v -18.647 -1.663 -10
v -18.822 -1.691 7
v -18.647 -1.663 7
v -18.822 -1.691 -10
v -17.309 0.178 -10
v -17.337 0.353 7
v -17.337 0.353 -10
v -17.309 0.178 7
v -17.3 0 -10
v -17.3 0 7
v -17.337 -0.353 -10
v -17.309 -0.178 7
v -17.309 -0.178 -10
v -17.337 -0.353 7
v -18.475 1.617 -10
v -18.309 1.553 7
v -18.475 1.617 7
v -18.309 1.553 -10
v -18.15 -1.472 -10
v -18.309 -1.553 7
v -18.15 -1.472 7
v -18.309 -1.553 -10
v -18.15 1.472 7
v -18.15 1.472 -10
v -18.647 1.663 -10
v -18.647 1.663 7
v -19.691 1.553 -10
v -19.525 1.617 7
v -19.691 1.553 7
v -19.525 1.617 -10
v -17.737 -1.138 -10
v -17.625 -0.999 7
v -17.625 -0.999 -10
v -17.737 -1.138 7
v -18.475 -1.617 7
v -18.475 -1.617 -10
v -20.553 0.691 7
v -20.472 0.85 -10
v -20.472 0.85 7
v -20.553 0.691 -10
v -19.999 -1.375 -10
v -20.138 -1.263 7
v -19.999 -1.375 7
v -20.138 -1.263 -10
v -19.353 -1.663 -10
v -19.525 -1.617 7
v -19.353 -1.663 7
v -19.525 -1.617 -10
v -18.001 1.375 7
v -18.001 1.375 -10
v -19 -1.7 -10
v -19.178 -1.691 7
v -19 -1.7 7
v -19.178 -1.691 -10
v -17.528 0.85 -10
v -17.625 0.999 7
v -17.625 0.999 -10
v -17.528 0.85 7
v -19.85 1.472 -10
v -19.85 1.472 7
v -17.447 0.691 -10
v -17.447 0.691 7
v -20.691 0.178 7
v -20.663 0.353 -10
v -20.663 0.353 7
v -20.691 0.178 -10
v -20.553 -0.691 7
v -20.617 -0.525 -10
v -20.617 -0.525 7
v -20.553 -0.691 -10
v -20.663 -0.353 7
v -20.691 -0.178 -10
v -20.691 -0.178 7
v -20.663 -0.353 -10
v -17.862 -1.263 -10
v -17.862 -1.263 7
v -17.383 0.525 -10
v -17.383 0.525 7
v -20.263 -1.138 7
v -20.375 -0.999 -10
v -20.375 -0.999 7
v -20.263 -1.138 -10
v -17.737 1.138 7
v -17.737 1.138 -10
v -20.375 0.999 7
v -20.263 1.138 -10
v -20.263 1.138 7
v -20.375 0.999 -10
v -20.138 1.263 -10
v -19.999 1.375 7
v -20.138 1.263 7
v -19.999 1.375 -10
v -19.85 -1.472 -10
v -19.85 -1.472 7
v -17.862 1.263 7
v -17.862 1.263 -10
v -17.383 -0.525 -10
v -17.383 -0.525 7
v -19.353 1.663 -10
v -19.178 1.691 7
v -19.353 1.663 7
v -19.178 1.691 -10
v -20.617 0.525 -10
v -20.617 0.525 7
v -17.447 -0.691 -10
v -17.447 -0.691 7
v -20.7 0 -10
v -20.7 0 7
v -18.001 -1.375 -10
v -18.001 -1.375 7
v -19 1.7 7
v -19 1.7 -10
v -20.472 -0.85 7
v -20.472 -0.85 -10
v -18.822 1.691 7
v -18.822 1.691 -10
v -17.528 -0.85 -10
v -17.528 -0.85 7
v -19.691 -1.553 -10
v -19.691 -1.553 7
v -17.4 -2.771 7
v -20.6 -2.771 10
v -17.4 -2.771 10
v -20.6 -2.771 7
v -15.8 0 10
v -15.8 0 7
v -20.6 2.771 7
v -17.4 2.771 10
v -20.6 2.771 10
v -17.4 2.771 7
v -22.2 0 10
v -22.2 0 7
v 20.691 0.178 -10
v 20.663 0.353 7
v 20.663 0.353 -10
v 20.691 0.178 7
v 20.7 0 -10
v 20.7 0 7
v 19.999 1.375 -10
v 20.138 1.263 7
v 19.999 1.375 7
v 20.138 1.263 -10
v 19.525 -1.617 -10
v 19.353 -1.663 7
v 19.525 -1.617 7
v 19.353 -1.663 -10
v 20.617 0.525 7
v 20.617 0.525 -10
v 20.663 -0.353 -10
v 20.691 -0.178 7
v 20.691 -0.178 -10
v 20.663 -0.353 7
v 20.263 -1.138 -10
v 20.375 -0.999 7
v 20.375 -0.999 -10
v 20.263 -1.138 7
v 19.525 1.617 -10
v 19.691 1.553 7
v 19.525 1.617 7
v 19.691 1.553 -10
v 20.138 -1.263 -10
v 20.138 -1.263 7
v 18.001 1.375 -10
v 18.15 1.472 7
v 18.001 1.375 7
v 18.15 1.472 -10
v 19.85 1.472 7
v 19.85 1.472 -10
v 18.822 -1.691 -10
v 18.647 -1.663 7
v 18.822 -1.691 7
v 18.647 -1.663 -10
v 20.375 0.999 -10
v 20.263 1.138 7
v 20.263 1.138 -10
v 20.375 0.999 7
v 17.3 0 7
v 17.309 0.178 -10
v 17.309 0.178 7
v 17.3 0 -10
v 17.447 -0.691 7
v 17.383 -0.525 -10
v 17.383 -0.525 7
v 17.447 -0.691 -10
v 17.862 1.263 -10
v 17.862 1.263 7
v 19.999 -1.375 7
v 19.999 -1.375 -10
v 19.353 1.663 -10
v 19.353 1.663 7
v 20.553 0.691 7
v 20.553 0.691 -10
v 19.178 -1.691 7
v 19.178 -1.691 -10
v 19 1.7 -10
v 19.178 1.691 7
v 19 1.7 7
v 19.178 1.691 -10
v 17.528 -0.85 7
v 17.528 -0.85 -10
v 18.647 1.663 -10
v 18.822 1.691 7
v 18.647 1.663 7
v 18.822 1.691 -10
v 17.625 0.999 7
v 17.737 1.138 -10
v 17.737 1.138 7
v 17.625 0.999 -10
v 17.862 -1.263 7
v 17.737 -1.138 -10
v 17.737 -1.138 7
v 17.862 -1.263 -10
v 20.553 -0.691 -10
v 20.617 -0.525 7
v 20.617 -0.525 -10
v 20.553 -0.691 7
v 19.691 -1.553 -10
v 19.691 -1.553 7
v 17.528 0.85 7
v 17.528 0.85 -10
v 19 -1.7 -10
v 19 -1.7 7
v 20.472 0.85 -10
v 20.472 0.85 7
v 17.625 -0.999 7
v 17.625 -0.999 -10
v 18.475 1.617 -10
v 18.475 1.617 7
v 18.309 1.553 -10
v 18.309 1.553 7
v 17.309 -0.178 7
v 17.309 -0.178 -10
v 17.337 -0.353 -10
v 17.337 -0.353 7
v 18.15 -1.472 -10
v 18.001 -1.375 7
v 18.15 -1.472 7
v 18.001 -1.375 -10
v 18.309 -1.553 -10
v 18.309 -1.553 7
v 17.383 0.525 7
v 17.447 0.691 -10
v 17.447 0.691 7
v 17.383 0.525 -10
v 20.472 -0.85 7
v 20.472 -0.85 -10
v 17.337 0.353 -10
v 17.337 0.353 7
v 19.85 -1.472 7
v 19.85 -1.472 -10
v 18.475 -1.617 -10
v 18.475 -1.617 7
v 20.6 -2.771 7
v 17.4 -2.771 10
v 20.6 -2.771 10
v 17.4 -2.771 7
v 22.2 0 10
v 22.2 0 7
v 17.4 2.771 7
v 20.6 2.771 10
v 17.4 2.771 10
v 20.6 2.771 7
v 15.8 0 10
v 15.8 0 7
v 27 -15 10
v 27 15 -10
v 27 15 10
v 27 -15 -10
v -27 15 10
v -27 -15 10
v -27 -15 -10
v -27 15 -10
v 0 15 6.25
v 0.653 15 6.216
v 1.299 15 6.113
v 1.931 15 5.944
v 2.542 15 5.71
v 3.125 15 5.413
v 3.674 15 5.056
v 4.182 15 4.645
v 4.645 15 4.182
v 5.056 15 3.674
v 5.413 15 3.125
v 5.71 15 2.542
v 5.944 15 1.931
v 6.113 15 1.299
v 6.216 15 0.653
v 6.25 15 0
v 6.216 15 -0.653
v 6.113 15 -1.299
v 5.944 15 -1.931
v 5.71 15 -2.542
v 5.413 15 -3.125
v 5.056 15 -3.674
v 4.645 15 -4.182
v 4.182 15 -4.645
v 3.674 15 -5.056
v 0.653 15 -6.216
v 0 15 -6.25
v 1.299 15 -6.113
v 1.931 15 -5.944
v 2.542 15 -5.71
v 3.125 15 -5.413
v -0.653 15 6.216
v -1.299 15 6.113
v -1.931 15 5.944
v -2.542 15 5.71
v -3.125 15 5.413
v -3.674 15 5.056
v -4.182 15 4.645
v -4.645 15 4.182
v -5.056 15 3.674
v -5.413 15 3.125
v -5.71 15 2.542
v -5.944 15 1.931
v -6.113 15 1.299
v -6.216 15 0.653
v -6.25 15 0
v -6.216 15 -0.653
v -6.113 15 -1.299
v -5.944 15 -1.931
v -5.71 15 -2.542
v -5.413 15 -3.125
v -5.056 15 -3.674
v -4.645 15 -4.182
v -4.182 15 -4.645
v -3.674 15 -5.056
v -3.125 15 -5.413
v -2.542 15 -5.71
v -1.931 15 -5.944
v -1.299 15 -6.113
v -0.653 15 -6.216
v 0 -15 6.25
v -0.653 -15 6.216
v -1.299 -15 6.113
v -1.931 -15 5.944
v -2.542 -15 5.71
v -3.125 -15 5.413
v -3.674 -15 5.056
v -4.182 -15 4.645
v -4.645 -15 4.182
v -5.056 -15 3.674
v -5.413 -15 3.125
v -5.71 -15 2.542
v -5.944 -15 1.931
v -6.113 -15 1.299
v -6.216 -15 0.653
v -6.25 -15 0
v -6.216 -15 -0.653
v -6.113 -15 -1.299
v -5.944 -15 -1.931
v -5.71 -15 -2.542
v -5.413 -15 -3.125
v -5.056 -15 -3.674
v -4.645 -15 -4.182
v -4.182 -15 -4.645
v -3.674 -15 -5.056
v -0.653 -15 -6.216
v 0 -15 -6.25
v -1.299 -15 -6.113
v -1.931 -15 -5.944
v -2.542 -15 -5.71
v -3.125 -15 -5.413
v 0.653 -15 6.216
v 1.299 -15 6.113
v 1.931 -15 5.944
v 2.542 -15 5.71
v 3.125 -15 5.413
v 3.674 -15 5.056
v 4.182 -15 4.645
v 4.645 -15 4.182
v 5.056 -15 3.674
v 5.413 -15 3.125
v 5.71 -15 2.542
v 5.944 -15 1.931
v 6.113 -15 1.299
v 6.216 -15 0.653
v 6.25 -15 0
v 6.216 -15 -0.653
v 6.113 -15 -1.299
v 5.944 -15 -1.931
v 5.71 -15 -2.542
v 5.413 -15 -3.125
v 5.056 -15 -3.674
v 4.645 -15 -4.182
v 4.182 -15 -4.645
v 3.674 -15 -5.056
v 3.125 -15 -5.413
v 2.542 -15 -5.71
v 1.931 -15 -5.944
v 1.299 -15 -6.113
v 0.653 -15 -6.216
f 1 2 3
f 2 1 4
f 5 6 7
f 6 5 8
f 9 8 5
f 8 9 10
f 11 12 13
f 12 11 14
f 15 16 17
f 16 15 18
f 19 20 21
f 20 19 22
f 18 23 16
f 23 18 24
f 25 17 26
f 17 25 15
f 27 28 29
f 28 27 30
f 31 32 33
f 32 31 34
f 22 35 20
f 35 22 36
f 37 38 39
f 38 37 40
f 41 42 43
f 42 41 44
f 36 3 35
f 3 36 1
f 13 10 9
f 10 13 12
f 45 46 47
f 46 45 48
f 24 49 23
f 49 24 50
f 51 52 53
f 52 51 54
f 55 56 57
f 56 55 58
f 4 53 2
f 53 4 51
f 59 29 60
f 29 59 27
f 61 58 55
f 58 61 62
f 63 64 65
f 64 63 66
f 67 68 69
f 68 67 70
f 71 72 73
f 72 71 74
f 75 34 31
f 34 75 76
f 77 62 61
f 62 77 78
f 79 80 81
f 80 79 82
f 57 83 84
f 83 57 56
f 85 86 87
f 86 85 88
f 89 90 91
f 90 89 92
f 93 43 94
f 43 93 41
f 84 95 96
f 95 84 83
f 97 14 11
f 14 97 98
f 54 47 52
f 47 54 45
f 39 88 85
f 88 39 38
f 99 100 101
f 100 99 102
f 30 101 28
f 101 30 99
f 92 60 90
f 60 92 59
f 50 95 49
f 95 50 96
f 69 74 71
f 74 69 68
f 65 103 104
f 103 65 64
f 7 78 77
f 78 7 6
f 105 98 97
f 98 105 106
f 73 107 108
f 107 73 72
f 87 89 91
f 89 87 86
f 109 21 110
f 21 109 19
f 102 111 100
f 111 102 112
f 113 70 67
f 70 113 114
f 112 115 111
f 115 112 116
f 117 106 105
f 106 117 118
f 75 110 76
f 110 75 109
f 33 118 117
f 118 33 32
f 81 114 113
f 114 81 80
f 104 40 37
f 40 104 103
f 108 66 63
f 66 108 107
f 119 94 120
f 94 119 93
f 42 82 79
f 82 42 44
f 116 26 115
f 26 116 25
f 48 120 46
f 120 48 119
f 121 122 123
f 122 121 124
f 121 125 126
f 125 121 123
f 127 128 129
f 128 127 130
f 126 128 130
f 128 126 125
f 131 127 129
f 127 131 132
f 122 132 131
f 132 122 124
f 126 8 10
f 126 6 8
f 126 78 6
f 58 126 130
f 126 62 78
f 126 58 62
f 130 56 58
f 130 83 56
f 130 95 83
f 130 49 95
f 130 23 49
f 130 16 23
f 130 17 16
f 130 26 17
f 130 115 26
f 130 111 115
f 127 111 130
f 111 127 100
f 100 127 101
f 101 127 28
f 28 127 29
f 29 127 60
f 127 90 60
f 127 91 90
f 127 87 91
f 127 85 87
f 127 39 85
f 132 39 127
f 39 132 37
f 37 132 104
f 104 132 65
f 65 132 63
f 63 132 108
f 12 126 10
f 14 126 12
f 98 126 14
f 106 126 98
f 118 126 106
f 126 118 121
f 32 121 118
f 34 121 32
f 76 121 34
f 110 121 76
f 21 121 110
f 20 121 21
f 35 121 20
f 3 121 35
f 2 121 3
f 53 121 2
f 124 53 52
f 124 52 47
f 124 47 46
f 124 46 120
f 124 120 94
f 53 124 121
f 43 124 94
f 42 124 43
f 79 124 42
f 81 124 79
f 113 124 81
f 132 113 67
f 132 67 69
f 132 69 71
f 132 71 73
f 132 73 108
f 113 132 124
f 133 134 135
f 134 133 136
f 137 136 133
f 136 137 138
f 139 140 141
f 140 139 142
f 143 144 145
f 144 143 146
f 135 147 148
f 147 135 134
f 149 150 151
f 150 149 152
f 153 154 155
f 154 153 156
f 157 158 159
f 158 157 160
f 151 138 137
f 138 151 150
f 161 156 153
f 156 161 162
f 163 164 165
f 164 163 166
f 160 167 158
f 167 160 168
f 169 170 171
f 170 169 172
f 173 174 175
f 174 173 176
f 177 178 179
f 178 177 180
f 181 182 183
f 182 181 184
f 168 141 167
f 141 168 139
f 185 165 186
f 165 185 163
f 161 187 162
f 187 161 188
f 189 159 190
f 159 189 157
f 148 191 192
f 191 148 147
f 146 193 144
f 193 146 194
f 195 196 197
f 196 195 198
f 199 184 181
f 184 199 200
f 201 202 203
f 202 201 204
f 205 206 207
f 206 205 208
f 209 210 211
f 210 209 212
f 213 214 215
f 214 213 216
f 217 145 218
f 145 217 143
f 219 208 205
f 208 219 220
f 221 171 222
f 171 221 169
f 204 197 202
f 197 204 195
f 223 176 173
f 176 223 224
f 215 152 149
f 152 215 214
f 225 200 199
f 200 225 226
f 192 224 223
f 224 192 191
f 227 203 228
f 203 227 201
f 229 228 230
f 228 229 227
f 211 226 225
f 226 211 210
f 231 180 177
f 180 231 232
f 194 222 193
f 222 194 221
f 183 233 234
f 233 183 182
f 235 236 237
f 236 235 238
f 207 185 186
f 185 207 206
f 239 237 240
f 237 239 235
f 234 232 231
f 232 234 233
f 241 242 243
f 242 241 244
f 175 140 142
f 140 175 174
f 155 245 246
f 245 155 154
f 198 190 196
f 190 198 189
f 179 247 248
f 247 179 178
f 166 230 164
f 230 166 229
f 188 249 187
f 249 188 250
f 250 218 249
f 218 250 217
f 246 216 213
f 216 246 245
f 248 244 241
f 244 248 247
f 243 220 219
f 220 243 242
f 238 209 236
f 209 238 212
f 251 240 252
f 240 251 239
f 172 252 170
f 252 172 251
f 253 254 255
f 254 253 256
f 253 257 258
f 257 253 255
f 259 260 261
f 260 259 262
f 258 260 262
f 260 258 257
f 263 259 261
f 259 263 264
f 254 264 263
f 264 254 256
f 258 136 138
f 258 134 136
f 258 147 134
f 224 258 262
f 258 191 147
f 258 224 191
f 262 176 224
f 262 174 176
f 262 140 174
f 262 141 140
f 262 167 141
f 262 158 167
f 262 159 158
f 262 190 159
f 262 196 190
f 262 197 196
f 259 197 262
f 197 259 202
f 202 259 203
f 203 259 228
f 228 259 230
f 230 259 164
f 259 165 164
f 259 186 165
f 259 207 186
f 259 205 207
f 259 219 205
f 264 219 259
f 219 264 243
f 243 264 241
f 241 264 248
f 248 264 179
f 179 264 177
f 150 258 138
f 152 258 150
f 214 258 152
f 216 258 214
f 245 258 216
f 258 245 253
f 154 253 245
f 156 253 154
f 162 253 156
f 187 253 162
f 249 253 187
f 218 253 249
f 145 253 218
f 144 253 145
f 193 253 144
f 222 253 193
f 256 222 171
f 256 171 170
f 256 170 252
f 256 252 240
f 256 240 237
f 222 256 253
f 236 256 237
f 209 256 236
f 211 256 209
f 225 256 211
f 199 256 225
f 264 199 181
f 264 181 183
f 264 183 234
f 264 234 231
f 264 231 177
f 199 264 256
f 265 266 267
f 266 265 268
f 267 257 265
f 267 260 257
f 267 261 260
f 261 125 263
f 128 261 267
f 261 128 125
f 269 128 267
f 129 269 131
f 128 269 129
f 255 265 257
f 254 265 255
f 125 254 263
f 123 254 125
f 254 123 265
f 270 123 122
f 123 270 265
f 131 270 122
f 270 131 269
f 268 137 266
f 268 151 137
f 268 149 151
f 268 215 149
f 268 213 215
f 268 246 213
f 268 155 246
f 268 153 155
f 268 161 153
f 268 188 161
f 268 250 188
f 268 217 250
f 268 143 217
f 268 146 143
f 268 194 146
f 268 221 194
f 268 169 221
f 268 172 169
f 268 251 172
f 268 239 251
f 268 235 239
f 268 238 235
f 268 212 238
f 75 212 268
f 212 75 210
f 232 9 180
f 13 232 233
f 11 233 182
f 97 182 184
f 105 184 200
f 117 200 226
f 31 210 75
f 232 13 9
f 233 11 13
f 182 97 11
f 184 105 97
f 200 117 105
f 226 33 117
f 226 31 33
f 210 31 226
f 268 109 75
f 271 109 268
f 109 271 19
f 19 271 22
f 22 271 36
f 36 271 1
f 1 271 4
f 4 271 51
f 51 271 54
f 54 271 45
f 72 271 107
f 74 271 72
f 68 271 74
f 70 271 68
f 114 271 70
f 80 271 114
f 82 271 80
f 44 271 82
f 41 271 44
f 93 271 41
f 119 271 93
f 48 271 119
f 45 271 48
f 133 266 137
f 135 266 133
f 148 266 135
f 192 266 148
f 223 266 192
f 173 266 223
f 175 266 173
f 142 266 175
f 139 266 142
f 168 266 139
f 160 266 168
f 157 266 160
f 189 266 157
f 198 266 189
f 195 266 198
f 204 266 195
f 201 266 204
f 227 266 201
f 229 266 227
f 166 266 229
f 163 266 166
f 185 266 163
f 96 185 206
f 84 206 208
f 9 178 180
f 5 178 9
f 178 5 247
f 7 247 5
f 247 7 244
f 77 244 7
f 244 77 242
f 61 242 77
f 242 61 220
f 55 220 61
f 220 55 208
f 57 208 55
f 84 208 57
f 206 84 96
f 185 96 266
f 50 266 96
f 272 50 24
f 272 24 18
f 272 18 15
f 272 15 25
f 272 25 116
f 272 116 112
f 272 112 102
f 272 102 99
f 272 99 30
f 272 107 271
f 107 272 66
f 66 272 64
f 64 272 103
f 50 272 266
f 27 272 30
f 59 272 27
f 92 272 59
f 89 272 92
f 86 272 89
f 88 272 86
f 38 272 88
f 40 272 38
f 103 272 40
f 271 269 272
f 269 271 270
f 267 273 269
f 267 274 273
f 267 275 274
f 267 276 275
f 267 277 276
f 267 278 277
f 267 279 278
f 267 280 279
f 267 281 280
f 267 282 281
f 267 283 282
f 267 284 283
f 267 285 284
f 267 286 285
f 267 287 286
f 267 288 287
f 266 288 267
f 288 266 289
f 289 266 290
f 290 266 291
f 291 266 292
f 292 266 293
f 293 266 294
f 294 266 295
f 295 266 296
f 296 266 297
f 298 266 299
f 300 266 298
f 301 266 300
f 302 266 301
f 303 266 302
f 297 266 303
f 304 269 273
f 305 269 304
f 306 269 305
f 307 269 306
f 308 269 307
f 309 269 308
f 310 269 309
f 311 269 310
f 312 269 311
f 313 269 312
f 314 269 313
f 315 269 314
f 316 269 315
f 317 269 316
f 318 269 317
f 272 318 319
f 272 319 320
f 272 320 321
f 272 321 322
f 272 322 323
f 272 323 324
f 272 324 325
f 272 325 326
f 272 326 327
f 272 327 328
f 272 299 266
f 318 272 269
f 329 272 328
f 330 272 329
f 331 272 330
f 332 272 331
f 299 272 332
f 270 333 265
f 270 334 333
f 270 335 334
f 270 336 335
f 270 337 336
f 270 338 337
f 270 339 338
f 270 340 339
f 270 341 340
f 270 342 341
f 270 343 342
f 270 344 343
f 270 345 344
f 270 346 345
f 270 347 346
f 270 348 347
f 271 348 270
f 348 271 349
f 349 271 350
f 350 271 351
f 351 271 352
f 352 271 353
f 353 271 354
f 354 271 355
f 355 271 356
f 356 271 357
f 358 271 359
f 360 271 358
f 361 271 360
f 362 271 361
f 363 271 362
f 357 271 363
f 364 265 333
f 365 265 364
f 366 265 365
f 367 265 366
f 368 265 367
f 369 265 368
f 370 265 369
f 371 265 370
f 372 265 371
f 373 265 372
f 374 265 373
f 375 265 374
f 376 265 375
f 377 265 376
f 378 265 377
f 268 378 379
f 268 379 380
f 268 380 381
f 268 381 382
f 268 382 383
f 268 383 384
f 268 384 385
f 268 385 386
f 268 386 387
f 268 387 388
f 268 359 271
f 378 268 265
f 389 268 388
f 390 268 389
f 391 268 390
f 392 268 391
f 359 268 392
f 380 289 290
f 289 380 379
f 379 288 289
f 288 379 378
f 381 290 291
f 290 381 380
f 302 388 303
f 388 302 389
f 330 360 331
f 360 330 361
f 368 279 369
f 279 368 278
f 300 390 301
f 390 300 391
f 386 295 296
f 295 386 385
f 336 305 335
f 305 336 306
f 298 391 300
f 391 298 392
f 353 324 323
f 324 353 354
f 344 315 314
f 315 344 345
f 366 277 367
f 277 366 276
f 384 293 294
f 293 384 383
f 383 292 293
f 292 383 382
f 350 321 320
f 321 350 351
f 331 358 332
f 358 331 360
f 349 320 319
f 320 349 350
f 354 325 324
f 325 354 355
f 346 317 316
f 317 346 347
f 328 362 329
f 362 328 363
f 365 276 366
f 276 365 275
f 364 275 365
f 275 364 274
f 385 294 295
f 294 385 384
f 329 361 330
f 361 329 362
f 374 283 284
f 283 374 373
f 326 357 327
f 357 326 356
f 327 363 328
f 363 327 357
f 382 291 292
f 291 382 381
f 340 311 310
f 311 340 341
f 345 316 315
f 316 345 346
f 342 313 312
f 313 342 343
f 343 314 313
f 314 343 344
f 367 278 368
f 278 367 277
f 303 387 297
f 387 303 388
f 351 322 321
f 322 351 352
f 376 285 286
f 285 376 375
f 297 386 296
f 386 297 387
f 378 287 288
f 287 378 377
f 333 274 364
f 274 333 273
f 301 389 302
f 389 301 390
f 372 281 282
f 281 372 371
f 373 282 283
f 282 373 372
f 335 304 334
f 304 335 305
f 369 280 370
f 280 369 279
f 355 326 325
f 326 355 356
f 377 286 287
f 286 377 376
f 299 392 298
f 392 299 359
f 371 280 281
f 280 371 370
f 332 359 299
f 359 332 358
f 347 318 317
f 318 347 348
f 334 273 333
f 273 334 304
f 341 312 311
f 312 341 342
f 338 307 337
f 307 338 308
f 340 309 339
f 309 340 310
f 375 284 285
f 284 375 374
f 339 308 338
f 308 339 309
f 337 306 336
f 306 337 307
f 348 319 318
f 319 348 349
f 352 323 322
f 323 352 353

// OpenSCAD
// Cable strain-relief clamp for 12 mm bundle.
$fn = 60;
eps = 0.02;
body_l = 54;
body_w = 30;
body_h = 20;
cable_d = 12.5;
bolt_pitch = 38;
difference() {
    cube([body_l, body_w, body_h], center = true);
    translate([0, -body_w / 2 - eps, 0]) rotate([-90, 0, 0]) cylinder(d = cable_d, h = body_w + 2 * eps);
    for (x = [-bolt_pitch / 2, bolt_pitch / 2]) {
        translate([x, 0, -body_h / 2 - eps]) cylinder(d = 3.4, h = body_h + 2 * eps);
        translate([x, 0, body_h / 2 - 3]) cylinder(d = 6.4, h = 3 + eps, $fn = 6);
    }
}
